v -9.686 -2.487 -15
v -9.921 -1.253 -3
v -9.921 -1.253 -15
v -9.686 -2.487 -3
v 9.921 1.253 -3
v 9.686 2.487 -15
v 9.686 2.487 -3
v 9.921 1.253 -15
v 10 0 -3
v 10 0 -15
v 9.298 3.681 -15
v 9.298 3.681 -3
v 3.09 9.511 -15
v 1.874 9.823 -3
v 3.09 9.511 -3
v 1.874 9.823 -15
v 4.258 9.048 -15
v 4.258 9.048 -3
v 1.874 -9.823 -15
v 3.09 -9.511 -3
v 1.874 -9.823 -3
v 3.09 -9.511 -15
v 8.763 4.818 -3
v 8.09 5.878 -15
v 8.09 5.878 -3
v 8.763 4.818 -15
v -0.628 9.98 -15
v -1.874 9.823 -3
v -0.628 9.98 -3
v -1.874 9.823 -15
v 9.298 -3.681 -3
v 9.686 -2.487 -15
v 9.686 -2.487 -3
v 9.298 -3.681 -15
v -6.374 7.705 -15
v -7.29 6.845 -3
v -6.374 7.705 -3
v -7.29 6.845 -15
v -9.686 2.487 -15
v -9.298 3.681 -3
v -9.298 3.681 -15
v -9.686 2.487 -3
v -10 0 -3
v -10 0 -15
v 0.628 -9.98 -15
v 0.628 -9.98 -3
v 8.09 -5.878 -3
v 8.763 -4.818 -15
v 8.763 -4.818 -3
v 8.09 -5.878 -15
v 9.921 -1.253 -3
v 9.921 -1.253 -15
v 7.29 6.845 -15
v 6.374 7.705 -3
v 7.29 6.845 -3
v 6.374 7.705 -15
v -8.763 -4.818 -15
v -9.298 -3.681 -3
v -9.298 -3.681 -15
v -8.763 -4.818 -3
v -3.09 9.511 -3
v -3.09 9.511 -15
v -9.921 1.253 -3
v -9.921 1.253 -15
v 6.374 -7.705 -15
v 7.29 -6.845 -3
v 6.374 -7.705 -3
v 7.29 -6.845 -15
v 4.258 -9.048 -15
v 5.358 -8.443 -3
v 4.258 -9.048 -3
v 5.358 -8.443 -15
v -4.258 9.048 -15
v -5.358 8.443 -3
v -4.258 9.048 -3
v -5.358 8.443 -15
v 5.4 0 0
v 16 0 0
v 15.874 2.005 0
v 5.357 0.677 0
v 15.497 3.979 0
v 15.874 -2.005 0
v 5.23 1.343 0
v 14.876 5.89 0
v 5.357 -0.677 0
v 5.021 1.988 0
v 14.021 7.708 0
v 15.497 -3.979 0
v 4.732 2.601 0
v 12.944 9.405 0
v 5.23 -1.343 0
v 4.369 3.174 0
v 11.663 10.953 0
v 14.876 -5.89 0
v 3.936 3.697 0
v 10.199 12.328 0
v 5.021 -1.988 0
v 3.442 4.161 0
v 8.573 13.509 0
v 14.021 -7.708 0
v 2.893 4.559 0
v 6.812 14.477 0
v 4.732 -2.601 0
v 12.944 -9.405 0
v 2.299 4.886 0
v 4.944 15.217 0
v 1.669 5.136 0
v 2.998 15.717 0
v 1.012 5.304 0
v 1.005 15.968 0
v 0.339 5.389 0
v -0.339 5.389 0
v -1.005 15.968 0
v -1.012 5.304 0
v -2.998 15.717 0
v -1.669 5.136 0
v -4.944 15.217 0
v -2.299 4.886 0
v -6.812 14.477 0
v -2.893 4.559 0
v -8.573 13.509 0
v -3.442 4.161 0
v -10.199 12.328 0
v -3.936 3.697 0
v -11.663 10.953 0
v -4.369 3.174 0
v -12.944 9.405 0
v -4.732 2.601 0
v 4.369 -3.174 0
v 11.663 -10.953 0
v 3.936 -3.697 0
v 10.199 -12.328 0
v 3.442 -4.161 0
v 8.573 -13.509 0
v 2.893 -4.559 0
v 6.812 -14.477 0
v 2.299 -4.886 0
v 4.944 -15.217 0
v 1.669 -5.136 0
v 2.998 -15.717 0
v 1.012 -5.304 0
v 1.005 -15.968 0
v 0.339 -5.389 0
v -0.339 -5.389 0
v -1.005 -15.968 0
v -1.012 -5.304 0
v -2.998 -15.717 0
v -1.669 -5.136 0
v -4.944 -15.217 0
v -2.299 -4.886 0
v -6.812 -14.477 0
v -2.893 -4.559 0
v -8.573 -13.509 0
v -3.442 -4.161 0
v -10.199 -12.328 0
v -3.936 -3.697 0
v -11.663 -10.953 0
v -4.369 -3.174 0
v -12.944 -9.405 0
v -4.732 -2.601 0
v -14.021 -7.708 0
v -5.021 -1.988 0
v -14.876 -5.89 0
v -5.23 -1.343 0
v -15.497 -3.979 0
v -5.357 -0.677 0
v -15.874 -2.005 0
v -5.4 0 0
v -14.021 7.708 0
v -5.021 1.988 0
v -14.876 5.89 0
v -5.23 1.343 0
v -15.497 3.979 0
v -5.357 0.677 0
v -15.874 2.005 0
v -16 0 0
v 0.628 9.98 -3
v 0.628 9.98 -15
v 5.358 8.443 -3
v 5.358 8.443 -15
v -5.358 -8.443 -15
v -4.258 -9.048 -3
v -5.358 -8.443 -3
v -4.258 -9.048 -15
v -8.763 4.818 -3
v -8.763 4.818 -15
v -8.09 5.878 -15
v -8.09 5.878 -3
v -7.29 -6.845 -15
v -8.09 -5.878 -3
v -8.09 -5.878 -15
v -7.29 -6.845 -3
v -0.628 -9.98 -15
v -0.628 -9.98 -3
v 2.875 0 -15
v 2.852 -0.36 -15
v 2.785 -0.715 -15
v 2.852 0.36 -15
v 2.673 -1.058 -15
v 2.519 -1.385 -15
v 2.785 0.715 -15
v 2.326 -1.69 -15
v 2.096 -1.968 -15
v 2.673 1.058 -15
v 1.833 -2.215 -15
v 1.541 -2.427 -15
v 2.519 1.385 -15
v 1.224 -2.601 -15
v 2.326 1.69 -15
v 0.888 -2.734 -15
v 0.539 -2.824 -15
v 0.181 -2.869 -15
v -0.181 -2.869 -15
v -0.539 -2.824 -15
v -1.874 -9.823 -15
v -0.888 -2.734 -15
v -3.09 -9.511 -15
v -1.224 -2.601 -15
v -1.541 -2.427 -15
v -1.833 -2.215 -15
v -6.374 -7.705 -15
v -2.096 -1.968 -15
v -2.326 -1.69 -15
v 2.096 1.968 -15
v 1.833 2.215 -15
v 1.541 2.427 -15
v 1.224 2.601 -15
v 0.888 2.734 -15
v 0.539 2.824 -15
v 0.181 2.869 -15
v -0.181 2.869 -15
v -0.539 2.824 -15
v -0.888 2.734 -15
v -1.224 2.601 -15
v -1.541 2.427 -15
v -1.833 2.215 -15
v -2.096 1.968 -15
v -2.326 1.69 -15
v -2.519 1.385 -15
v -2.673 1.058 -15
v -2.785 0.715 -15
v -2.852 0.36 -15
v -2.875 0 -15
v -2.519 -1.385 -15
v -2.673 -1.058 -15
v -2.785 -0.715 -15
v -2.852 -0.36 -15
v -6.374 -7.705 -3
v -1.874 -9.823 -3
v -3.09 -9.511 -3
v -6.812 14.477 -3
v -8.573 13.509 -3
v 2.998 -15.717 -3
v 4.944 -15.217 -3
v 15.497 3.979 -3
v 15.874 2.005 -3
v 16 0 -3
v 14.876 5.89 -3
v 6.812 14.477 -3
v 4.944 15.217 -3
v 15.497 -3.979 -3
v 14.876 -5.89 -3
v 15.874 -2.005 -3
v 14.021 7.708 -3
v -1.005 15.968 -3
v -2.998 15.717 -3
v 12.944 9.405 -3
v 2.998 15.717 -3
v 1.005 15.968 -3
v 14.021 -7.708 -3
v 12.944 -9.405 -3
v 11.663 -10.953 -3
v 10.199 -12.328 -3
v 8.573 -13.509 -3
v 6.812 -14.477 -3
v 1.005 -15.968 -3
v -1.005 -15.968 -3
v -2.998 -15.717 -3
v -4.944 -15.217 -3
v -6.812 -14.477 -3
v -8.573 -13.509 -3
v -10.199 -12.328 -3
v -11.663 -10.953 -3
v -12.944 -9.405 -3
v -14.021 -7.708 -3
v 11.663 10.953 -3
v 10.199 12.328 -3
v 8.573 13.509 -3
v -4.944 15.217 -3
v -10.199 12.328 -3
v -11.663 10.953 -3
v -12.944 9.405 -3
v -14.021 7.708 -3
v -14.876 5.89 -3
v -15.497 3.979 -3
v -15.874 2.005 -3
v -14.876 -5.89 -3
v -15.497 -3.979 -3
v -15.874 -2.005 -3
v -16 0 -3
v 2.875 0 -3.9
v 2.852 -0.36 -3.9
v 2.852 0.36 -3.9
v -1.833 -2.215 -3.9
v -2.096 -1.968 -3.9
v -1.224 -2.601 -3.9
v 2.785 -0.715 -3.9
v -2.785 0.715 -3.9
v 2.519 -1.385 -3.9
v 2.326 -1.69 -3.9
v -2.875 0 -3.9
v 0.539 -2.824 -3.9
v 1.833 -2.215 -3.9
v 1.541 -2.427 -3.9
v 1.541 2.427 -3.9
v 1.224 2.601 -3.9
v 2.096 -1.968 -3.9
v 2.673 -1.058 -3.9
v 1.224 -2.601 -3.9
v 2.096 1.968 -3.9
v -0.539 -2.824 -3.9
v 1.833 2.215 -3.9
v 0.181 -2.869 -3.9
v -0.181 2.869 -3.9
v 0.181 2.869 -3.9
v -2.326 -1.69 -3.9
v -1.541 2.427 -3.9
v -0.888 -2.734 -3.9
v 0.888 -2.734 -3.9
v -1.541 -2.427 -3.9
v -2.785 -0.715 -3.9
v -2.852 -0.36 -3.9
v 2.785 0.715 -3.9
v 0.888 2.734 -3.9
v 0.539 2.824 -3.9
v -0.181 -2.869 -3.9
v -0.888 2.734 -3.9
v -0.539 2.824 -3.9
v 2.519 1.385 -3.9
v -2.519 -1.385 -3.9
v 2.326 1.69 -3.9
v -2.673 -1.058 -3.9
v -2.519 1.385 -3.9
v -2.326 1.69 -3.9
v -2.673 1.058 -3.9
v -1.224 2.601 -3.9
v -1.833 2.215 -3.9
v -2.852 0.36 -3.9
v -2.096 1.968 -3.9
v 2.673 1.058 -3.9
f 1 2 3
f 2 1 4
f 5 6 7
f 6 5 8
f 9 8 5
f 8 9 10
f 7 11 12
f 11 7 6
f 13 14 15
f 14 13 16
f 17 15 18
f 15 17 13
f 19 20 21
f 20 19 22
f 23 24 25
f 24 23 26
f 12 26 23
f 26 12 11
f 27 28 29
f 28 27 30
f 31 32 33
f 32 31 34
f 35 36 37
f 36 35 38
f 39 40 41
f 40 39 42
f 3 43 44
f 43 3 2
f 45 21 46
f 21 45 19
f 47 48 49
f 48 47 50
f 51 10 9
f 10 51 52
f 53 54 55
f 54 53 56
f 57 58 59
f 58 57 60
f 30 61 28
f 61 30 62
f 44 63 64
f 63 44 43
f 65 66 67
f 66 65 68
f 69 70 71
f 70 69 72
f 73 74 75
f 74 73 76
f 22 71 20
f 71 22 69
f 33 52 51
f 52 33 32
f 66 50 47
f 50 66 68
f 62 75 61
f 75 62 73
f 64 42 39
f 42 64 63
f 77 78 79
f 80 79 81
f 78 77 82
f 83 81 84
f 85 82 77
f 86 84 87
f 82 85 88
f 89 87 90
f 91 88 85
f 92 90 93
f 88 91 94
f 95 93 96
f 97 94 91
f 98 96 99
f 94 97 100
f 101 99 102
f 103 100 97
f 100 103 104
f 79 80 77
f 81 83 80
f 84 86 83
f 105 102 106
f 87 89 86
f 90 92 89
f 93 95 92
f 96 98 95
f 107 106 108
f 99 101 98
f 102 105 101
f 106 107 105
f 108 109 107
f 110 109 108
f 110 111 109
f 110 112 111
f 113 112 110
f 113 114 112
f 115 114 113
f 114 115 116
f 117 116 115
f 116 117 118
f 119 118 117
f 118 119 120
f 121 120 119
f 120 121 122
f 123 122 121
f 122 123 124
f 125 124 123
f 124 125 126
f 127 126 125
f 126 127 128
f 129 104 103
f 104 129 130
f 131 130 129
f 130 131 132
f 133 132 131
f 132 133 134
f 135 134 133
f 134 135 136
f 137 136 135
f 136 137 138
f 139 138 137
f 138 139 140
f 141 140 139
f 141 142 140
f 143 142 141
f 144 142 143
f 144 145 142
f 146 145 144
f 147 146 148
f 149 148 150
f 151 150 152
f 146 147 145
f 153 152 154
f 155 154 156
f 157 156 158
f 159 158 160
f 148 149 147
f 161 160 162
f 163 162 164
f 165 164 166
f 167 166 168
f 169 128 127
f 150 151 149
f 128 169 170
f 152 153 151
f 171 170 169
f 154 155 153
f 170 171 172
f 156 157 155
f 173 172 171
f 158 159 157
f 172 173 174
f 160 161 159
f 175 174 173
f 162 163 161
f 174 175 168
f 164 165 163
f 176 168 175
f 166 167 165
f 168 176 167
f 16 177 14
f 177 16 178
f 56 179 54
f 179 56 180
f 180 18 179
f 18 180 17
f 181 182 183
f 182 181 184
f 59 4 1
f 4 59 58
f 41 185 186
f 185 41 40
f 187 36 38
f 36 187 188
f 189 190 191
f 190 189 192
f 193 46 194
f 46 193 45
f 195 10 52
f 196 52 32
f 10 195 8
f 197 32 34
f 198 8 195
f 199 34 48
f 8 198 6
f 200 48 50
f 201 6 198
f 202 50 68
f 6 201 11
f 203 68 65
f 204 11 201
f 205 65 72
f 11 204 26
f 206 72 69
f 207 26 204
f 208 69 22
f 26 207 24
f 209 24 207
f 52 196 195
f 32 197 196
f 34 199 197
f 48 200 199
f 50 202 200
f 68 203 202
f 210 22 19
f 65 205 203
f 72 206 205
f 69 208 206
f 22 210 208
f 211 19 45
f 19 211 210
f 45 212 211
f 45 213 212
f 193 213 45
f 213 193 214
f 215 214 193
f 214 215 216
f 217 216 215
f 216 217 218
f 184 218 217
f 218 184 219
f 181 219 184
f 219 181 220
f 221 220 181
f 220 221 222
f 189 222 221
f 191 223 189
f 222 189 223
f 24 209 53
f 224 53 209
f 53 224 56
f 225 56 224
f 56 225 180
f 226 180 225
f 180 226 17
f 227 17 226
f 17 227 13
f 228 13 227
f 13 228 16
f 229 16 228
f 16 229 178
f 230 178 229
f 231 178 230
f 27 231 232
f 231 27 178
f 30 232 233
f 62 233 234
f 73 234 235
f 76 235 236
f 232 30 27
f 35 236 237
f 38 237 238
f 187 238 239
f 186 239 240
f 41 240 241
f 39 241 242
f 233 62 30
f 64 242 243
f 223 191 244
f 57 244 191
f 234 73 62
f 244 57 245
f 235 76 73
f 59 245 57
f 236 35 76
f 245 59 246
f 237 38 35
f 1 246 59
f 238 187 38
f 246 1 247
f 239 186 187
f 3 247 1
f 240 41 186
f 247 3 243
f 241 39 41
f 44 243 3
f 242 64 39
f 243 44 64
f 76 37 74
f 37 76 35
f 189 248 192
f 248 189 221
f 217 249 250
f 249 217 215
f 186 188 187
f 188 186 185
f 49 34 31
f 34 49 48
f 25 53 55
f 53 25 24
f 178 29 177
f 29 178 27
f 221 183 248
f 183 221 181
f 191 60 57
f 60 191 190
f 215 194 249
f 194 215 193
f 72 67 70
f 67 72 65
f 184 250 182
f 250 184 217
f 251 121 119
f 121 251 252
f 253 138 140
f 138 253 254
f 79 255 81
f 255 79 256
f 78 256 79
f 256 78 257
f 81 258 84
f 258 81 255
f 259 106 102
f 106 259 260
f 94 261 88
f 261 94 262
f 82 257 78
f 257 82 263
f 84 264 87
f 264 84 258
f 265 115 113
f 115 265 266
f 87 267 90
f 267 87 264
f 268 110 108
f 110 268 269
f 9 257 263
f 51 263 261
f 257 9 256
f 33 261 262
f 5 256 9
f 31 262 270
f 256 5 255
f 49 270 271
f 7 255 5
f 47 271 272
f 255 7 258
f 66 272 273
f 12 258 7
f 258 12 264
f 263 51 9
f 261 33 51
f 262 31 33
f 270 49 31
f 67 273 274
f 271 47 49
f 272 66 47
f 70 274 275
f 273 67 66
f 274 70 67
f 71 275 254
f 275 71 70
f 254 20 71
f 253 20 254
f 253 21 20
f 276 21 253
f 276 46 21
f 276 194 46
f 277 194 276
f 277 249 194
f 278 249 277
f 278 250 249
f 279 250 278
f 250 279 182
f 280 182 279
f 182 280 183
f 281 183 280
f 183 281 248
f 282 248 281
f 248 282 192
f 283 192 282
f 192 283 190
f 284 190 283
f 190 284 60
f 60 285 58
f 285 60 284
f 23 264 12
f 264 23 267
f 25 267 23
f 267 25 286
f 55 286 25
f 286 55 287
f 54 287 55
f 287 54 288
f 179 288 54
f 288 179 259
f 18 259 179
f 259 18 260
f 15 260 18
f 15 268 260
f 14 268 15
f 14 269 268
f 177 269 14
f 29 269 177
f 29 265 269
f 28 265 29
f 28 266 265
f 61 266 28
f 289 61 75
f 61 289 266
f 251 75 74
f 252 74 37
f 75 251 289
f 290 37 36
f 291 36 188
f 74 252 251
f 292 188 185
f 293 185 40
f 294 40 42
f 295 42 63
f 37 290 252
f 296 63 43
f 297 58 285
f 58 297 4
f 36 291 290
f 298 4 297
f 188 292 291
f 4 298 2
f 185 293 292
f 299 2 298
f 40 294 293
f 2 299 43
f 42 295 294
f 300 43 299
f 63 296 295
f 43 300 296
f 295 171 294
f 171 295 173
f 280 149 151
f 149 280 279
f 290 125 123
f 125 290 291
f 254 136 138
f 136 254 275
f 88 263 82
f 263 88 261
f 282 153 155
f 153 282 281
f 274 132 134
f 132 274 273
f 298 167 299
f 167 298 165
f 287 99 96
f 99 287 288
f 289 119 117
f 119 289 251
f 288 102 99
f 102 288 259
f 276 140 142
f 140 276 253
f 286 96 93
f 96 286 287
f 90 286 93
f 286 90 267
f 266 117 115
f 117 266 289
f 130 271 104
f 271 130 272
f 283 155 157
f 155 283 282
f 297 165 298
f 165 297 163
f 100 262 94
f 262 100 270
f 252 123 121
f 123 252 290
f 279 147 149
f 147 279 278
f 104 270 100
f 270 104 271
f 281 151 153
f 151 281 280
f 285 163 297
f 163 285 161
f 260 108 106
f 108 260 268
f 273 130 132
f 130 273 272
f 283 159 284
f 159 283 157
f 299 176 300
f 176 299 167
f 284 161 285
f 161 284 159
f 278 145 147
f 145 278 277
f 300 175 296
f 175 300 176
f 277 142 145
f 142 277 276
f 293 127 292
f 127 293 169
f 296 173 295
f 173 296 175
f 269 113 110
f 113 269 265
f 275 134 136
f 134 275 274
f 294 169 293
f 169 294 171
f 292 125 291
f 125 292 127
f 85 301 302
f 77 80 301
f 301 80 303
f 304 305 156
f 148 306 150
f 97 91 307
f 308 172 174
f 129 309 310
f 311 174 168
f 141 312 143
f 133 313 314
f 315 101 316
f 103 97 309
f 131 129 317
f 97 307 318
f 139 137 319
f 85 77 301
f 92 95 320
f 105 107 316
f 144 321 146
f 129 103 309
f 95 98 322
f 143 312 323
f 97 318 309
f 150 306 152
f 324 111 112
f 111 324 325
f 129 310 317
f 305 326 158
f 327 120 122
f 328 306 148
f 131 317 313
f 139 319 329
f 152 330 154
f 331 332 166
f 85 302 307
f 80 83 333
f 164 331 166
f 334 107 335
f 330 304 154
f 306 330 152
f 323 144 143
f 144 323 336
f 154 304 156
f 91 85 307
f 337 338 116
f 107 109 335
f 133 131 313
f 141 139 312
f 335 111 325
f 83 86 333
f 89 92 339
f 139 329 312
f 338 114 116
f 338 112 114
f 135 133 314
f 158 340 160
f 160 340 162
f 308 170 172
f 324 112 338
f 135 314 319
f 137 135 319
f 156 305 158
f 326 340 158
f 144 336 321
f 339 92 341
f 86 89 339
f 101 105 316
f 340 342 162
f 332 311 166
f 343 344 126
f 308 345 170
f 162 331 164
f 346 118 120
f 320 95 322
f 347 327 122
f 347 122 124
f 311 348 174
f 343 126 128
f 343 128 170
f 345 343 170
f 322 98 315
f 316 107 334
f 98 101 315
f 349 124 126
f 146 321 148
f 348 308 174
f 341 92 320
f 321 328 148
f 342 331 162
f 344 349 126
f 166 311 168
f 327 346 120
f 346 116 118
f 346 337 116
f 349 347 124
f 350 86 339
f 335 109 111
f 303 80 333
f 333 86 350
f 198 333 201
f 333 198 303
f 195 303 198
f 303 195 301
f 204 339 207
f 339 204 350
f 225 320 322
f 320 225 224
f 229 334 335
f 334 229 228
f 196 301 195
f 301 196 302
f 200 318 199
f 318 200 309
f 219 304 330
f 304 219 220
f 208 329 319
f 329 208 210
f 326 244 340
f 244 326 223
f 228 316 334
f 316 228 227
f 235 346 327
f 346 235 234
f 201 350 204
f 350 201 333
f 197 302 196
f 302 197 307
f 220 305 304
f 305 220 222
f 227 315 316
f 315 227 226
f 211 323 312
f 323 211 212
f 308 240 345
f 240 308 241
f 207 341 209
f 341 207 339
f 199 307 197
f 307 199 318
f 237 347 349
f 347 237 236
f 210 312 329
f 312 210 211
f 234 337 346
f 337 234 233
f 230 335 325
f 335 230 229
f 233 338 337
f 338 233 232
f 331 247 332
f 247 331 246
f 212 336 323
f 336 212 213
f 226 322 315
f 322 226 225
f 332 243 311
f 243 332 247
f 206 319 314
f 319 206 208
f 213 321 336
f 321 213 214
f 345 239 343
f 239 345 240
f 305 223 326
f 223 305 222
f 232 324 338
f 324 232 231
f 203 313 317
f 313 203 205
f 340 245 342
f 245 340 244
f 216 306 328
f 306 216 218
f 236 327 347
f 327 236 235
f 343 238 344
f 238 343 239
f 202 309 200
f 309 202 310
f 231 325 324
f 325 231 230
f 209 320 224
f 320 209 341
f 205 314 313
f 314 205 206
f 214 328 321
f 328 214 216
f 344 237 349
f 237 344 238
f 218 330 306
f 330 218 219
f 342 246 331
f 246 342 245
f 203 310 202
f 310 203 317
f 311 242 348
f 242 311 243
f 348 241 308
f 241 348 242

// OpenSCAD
$fn = 50;


difference() {
	union() {
		translate(v = [0, 0, -15.0000000000]) {
			cylinder(h = 15, r = 10.0000000000);
		}
		translate(v = [0, 0, -3.0000000000]) {
			cylinder(h = 3, r = 16.0000000000);
		}
	}
	union() {
		translate(v = [0, 0, 0]) {
			rotate(a = [0, 0, 0]) {
				difference() {
					union() {
						#translate(v = [0, 0, -15.0000000000]) {
							cylinder(h = 15, r = 2.6000000000);
						}
						#translate(v = [0, 0, -3.9000000000]) {
							cylinder(h = 3.9000000000, r = 10.0000000000, r1 = 2.8750000000, r2 = 5.4000000000);
						}
						#translate(v = [0, 0, -15.0000000000]) {
							cylinder(h = 15, r = 2.8750000000);
						}
						#translate(v = [0, 0, -15.0000000000]) {
							cylinder(h = 15, r = 2.6000000000);
						}
					}
					union();
				}
			}
		}
	}
}
